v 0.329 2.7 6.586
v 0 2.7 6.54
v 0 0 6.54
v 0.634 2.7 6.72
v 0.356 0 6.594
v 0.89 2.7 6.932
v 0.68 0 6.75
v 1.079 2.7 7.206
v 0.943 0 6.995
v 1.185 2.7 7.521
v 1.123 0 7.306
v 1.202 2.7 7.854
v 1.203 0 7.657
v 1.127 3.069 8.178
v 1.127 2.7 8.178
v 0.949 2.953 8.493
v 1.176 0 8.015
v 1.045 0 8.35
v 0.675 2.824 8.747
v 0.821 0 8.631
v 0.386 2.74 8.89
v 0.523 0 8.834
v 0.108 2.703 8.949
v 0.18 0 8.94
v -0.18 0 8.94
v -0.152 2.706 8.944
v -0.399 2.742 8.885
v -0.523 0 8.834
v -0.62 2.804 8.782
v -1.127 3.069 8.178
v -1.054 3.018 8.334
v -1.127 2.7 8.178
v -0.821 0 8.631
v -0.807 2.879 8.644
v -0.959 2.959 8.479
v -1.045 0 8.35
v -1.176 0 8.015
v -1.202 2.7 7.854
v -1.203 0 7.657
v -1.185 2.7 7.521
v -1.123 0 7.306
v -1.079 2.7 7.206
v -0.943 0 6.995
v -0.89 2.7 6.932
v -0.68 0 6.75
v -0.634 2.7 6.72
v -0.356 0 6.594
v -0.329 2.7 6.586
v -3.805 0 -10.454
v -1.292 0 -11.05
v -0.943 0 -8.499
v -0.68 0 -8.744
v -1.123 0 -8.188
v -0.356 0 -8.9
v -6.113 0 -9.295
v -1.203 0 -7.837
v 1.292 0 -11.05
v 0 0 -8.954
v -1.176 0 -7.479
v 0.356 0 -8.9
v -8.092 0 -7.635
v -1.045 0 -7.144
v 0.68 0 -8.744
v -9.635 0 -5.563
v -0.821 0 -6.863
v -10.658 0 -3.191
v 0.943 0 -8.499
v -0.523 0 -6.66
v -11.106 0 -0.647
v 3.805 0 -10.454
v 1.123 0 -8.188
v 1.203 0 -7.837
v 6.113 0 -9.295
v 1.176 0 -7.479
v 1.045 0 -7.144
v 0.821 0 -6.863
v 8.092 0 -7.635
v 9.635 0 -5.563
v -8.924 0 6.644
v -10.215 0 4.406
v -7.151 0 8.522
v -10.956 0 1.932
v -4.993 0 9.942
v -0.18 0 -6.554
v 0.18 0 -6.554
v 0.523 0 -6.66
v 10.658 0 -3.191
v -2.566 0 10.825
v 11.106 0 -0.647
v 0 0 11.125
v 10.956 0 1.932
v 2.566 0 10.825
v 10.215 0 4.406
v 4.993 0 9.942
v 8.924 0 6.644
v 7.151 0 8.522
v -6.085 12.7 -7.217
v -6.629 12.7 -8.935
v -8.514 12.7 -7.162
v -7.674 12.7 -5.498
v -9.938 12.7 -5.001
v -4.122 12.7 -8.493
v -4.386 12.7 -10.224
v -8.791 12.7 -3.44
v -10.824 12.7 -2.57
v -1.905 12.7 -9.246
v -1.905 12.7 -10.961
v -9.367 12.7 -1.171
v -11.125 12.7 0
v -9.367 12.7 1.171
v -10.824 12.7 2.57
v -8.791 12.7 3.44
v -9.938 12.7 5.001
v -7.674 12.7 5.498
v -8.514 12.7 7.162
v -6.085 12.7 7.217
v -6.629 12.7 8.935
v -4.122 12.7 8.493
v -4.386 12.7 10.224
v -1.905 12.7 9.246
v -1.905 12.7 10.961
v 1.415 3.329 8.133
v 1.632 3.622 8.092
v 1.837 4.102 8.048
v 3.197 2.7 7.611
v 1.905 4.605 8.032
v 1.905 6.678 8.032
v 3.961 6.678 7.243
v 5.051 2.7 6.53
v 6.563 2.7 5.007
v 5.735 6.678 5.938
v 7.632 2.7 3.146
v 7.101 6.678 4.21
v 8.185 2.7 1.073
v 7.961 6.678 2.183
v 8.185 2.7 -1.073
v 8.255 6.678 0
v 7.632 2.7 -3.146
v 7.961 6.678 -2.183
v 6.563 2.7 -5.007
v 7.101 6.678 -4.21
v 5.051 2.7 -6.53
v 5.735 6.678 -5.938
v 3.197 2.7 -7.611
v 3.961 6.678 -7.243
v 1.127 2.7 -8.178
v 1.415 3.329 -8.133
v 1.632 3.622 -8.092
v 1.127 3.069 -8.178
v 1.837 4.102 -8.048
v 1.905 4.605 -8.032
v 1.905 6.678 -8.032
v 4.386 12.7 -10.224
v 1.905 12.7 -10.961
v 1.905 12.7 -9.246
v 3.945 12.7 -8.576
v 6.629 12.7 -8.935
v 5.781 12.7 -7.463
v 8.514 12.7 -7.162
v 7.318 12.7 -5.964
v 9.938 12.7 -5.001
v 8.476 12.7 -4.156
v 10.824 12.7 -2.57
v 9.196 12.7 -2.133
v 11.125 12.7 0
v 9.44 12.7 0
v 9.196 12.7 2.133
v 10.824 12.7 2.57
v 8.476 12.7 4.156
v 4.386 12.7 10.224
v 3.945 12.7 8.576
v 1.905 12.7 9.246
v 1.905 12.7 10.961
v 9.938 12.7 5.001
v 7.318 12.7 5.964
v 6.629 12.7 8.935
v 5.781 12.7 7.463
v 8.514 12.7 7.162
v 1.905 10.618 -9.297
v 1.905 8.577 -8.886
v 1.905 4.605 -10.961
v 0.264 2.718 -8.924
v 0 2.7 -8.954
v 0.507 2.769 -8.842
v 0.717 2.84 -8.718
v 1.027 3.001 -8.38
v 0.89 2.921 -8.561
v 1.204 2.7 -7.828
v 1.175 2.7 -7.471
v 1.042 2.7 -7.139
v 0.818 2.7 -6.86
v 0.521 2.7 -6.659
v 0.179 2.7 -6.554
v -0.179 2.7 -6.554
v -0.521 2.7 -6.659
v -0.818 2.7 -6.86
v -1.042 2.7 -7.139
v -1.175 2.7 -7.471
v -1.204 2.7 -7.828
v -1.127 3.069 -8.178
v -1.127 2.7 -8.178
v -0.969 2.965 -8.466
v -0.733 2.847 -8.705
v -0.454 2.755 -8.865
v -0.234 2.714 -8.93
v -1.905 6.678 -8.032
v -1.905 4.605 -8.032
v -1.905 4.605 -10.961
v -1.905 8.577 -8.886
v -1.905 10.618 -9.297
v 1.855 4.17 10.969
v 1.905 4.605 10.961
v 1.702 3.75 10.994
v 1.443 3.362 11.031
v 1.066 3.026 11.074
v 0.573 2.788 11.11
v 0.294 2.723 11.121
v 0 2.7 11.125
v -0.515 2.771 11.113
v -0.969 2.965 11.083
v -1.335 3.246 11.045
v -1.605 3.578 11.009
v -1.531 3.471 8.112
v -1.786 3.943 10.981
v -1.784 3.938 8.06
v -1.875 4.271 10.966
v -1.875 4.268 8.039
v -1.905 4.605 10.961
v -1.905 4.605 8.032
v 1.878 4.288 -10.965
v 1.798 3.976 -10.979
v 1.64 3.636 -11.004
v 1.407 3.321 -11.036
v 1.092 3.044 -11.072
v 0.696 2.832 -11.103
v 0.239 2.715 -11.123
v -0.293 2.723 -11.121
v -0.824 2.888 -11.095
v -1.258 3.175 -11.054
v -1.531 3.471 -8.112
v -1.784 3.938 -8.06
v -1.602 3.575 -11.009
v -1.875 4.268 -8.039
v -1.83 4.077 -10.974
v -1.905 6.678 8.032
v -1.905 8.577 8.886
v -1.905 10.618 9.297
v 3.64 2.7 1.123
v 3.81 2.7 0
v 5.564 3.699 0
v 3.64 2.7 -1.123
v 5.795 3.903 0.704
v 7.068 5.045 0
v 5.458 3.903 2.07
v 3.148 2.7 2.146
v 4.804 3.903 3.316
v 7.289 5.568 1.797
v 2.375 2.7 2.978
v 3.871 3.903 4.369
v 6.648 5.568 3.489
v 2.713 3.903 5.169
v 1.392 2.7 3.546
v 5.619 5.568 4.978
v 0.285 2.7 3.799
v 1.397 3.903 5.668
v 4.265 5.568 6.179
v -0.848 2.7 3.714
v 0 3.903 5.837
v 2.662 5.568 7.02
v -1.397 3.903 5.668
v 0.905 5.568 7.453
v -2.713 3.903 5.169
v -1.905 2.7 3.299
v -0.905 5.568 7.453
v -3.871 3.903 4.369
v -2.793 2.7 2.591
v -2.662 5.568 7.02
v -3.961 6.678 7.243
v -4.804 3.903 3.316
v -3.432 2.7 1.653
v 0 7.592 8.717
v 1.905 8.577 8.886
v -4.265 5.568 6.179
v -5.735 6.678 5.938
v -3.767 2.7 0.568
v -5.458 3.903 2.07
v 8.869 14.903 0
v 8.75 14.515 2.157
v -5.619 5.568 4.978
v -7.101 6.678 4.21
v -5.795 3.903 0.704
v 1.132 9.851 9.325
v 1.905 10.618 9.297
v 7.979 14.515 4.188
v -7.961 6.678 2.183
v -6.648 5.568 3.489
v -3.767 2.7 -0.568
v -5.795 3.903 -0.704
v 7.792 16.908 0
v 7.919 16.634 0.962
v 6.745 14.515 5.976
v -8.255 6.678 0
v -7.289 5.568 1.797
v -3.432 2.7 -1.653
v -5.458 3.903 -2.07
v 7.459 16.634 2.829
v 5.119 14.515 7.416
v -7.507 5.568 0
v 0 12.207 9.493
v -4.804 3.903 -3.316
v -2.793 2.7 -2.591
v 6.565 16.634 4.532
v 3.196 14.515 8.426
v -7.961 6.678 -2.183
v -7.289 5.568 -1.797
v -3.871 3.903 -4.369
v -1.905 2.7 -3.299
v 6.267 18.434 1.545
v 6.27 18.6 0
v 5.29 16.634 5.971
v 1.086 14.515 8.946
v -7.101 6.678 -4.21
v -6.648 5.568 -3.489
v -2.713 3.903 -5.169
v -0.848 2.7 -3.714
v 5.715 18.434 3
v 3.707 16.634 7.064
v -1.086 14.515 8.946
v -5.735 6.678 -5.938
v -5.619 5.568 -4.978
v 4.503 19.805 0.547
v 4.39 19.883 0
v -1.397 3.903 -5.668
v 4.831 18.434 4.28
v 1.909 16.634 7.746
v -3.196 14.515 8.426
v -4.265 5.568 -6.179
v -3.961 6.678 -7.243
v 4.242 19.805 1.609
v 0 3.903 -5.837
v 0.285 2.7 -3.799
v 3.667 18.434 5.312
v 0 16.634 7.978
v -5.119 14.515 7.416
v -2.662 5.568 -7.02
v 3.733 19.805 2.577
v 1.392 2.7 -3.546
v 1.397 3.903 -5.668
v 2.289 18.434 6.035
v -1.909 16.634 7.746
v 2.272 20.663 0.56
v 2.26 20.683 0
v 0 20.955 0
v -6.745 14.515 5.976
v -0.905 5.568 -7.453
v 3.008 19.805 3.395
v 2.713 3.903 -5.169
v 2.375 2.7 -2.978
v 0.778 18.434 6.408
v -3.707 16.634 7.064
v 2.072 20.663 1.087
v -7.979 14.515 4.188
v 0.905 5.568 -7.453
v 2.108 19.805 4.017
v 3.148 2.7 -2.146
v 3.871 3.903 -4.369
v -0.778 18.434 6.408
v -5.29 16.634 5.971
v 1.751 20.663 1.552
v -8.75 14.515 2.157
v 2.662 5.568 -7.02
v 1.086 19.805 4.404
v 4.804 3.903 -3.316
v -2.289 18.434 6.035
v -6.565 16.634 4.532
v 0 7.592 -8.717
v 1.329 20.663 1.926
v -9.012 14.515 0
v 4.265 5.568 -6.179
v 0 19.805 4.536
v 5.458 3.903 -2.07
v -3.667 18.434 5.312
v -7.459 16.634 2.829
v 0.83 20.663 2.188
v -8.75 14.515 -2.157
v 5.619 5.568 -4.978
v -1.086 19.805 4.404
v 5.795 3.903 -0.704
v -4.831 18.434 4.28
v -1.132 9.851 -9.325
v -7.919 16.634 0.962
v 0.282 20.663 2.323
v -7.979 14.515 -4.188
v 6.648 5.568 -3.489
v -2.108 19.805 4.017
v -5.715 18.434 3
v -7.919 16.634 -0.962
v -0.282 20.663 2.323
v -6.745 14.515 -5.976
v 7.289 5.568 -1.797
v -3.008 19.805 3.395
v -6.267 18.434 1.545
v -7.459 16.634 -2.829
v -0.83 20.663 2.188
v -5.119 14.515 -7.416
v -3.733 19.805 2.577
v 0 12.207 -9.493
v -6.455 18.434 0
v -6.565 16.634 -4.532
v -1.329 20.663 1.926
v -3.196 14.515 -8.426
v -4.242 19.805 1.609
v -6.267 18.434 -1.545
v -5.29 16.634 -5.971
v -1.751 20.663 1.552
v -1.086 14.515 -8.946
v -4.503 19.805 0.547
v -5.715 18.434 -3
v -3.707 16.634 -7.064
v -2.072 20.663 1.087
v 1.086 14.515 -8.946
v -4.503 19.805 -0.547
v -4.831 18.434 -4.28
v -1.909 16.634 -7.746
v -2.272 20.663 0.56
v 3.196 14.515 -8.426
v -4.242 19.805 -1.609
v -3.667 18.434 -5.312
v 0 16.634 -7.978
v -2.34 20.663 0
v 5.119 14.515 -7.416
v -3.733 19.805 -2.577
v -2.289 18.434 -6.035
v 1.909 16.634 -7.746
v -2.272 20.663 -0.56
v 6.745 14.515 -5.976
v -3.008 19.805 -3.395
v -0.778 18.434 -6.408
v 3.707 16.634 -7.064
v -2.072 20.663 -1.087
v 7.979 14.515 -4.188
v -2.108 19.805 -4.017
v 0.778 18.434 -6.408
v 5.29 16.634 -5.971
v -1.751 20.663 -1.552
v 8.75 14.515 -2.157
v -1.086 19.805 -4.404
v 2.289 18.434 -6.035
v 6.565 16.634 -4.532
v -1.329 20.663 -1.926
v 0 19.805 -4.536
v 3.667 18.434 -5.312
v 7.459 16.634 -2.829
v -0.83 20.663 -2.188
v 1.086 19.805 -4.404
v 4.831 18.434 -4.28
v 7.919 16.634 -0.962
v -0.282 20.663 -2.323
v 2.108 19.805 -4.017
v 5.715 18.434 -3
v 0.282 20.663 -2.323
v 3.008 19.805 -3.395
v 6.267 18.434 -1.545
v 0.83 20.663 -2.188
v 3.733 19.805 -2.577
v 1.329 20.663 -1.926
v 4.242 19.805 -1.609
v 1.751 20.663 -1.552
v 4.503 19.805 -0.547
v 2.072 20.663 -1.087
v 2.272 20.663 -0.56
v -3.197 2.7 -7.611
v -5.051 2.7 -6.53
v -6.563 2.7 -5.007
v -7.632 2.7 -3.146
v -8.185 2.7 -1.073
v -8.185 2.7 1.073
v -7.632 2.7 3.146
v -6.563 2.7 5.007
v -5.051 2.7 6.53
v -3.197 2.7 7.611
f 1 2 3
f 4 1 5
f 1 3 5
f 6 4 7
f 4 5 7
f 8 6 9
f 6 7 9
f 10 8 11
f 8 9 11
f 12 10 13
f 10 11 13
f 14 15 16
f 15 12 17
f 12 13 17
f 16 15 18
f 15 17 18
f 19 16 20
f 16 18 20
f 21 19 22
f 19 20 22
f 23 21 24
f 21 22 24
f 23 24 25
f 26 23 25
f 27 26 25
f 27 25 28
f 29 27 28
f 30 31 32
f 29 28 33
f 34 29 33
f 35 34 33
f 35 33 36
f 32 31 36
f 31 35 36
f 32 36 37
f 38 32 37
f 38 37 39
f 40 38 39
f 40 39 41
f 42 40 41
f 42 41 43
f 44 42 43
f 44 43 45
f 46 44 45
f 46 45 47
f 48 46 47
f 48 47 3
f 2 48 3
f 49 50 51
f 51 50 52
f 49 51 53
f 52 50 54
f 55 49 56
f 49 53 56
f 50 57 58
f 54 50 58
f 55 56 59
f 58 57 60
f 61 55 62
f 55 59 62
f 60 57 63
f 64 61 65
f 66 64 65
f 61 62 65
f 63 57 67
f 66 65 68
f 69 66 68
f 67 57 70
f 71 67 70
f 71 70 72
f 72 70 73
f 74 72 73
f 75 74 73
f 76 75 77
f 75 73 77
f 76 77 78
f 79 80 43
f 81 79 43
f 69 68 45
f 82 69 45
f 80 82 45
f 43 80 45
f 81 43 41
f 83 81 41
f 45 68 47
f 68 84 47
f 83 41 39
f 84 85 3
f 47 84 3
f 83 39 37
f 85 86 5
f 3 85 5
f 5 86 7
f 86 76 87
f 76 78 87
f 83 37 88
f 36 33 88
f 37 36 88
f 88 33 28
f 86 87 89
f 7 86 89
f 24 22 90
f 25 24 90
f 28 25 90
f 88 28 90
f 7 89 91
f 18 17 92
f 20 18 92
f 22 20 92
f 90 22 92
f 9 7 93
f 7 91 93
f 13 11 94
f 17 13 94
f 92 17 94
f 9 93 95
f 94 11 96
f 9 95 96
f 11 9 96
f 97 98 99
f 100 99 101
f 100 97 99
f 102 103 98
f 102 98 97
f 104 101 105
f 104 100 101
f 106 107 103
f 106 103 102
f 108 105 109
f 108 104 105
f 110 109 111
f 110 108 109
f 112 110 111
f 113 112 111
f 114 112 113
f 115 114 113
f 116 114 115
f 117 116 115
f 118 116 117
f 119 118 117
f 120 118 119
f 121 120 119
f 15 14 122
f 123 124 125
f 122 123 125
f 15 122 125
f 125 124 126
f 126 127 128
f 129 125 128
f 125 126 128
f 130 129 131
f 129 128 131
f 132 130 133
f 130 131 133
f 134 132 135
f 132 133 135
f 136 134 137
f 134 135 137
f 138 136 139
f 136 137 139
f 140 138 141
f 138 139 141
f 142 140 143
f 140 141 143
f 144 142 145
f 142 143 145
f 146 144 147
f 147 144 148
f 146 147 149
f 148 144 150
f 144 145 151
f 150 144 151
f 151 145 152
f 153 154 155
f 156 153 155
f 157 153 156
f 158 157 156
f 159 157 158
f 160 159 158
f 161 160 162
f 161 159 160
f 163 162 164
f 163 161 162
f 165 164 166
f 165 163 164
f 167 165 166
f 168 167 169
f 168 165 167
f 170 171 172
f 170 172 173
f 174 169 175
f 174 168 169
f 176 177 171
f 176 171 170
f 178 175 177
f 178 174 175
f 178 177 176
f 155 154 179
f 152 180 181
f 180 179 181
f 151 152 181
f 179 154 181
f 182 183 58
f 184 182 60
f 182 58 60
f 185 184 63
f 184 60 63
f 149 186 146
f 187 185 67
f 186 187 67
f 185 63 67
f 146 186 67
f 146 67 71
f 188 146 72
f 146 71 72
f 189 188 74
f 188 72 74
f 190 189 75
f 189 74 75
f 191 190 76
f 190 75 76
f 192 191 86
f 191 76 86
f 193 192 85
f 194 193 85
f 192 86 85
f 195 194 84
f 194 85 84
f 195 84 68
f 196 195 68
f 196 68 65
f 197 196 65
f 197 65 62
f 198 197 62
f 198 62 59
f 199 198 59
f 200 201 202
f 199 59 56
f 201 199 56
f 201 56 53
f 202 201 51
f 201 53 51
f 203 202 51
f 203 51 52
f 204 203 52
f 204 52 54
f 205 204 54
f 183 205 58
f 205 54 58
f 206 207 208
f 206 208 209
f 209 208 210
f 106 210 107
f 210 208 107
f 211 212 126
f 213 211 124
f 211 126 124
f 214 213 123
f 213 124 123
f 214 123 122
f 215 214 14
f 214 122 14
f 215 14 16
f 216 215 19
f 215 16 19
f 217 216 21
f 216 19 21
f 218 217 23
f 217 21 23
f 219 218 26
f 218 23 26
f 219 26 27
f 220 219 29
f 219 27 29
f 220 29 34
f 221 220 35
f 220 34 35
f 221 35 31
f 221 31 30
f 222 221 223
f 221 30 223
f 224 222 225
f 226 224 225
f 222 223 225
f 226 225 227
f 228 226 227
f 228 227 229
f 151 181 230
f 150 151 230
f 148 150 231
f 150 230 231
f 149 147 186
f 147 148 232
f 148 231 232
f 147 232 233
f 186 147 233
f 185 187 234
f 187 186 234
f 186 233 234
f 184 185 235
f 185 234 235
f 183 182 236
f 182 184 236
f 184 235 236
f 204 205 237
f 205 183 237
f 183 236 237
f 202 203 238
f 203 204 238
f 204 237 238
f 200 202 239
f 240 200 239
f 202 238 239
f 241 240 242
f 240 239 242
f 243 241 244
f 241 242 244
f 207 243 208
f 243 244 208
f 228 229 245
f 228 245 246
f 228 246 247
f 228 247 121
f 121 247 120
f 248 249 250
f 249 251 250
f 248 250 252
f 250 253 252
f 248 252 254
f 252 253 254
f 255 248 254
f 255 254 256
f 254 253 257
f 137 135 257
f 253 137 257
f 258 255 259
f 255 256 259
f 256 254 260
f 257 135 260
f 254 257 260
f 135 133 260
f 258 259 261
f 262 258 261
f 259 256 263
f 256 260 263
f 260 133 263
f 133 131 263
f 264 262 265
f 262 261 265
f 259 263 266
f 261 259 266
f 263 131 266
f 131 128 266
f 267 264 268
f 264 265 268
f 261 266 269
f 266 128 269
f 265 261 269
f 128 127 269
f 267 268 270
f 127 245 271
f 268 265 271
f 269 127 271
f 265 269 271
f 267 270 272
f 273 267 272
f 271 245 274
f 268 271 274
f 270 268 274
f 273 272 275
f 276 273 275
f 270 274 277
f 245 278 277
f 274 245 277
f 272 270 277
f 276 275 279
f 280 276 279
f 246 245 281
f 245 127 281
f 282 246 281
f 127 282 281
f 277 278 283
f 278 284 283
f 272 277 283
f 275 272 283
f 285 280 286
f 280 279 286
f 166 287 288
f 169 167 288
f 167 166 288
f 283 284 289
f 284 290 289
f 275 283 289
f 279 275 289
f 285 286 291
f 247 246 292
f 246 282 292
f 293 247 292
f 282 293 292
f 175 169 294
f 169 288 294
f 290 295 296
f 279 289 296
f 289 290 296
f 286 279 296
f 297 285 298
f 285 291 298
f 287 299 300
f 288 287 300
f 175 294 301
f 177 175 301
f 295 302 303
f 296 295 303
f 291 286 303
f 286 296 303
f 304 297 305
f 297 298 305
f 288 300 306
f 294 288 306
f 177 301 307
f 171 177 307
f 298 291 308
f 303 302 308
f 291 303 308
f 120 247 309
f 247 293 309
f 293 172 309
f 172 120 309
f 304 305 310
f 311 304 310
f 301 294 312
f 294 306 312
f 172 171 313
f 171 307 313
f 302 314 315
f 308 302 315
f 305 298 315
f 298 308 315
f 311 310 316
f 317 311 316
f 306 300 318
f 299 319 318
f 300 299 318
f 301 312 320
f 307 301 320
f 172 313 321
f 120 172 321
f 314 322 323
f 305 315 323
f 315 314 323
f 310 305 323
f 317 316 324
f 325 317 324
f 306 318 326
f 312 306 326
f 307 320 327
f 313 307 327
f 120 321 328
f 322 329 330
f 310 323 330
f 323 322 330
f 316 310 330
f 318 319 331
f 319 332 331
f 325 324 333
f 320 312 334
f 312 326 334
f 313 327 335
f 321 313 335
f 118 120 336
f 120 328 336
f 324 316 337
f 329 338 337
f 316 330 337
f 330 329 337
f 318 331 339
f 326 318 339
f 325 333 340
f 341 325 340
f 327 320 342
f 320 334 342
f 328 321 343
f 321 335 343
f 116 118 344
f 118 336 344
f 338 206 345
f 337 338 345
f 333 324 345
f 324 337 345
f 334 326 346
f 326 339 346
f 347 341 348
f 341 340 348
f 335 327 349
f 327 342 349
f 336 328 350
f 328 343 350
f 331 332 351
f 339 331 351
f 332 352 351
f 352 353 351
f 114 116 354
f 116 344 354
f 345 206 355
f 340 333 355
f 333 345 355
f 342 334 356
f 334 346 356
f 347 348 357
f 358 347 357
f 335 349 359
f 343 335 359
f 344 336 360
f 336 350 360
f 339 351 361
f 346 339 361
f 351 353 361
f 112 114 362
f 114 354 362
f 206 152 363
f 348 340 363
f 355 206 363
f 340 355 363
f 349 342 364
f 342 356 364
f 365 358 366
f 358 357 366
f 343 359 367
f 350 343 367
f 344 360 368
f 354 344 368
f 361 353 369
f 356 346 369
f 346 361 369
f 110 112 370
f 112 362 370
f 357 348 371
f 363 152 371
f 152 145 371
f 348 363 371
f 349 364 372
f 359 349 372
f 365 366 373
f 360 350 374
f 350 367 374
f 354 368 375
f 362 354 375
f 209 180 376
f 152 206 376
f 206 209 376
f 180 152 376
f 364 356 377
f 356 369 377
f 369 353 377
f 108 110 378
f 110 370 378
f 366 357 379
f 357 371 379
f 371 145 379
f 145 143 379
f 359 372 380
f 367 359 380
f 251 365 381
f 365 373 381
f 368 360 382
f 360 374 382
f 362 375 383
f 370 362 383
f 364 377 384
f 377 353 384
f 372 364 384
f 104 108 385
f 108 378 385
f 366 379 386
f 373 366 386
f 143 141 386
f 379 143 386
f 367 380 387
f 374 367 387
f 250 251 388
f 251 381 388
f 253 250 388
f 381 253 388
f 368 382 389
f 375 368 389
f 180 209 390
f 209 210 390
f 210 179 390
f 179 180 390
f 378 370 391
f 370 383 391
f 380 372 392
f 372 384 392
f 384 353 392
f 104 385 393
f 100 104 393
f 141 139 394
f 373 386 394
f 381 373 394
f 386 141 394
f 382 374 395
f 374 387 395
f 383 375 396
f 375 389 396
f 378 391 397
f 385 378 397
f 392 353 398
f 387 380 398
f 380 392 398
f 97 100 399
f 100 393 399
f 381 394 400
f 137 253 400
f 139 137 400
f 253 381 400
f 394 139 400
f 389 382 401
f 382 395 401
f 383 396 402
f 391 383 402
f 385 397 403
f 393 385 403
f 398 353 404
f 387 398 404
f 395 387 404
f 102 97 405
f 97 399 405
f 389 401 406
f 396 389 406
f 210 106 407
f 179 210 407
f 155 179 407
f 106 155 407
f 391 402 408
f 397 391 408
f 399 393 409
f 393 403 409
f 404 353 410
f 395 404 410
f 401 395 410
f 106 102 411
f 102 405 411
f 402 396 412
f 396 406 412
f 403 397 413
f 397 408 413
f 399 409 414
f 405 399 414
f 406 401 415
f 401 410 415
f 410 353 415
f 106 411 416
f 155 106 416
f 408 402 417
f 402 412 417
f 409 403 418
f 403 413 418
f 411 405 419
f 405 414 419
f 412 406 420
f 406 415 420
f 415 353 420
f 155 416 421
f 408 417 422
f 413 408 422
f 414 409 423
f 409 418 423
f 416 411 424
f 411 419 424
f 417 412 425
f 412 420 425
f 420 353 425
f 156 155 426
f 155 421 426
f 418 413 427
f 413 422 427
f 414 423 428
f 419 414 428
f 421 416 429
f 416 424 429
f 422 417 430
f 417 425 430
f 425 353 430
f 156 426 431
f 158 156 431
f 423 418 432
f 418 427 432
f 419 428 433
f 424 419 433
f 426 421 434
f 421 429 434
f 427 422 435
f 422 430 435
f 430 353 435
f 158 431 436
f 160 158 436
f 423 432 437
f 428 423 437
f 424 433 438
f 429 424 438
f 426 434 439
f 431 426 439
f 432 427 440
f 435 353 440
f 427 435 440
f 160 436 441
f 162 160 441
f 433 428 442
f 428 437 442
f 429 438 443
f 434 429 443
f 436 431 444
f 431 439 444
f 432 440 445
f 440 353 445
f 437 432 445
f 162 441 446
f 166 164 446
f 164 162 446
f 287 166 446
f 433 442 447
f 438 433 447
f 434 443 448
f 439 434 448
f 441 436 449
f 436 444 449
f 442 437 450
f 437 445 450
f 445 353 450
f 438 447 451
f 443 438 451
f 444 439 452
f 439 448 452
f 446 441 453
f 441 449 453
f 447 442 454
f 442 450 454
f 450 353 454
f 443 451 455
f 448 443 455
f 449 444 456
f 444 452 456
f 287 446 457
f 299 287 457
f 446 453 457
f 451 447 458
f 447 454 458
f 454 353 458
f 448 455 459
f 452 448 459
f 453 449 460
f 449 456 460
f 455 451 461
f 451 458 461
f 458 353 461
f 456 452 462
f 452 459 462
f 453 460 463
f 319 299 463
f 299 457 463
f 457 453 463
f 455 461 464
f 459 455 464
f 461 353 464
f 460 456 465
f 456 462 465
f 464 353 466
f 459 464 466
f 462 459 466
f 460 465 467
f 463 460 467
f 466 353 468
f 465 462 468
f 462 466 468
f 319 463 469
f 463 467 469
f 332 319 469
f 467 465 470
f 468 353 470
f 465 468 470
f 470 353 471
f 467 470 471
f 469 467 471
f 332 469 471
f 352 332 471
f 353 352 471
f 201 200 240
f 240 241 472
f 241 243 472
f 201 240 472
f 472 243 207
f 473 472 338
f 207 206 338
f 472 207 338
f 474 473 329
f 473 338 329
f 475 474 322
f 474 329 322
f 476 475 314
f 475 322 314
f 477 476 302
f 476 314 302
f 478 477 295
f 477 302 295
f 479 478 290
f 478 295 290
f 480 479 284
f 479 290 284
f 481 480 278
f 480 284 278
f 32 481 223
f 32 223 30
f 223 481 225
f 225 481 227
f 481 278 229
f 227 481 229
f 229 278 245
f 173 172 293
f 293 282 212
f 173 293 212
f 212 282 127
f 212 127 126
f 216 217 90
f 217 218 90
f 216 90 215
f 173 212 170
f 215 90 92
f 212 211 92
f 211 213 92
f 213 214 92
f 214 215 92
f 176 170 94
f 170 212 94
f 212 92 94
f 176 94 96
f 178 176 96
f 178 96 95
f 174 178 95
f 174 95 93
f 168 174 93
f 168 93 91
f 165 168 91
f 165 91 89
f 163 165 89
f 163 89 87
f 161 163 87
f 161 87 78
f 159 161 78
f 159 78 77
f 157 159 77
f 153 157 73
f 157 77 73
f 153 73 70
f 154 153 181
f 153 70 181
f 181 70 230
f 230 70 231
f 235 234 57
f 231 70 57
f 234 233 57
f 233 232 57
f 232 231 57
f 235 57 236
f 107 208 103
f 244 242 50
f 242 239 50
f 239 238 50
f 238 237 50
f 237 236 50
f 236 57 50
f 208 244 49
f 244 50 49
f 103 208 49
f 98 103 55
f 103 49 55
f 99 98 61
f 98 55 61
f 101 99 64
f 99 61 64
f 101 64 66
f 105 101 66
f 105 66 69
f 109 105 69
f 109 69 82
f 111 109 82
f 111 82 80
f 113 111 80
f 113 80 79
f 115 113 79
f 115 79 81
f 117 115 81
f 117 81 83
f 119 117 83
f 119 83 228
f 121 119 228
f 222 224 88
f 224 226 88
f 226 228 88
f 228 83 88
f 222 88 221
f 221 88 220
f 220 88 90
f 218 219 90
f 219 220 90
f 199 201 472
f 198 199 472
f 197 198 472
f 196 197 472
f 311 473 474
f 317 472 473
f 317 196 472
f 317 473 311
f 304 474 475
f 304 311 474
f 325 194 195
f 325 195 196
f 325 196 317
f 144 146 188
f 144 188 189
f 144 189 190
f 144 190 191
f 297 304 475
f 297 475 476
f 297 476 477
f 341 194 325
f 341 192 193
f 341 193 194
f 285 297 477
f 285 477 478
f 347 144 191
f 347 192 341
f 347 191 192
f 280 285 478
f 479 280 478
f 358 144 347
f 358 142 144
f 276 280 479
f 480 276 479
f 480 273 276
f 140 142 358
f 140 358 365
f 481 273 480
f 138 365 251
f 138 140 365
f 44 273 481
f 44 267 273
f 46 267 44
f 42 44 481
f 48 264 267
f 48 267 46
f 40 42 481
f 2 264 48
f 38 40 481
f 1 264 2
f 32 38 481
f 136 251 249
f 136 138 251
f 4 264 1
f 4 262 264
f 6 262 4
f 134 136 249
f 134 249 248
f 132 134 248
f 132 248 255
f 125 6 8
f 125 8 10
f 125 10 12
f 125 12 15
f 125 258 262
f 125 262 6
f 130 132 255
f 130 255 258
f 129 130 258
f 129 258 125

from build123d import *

# Parameters (mm, degrees)
SKETCH1_R           = 11.1252
BOSS_EXTRUDE1_DEPTH = 12.7
SKETCH4_R           = 8.255
CUT_EXTRUDE2_DEPTH  = 10
CUT_EXTRUDE1_DEPTH  = 28.930993094
CUT_EXTRUDE3_REACH  = 28.204
SKETCH5_R           = 1.2065


with BuildPart() as part:
    # Sketch1 → Boss-Extrude1 (new body)
    with BuildSketch(Plane(origin=(0, 0, 0), x_dir=(1, 0, 0), z_dir=(0, 1, 0))):
        Circle(SKETCH1_R)
    extrude(amount=BOSS_EXTRUDE1_DEPTH)

    # Sketch4 → Cut-Extrude2 (cut)
    with BuildSketch(Plane(origin=(0, 12.7, 0), x_dir=(1, 0, 0), z_dir=(0, 1, 0))):
        Circle(SKETCH4_R)
    extrude(amount=-CUT_EXTRUDE2_DEPTH, mode=Mode.SUBTRACT)

    # Sketch3 → Cut-Extrude1 (cut, through all)
    with BuildSketch(Plane(origin=(0, 0, -11.1252), x_dir=(-1, 0, 0), z_dir=(0, 0, -1))):
        with BuildLine():
            Line((-1.905, 12.7), (-1.905, 4.605))
            ThreePointArc((-1.905, 4.605), (0, 2.7), (1.905, 4.605))
            Line((1.905, 4.605), (1.905, 12.7))
            Line((1.905, 12.7), (-1.905, 12.7))
        make_face()
    extrude(amount=-CUT_EXTRUDE1_DEPTH, mode=Mode.SUBTRACT)

    # Sketch2 → Revolve3 (revolve)
    with BuildSketch(Plane.XY):
        with BuildLine():
            Line((0, 20.955), (0, 1.905))
            ThreePointArc((0, 1.905), (9.525, 11.43), (0, 20.955))
        make_face()
    revolve(axis=Axis((0, 20.955, 0), (0, -1, 0)))

    # Sketch5 → Cut-Extrude3 (cut, up to next)
    with BuildSketch(Plane.XZ, mode=Mode.PRIVATE) as cut_extrude3_sk1:
        with Locations((0, 7.747)):
            Circle(SKETCH5_R)
    cut_extrude3_tool1 = extrude(cut_extrude3_sk1.sketch, amount=-CUT_EXTRUDE3_REACH, mode=Mode.PRIVATE) & part.part
    # Sketch5 → Cut-Extrude3 (cut, up to next)
    with BuildSketch(Plane.XZ, mode=Mode.PRIVATE) as cut_extrude3_sk2:
        with Locations((0, -7.747)):
            Circle(SKETCH5_R)
    cut_extrude3_tool2 = extrude(cut_extrude3_sk2.sketch, amount=-CUT_EXTRUDE3_REACH, mode=Mode.PRIVATE) & part.part
    add(cut_extrude3_tool1.solids().sort_by_distance((0, 0, 7.747))[0], mode=Mode.SUBTRACT)
    add(cut_extrude3_tool2.solids().sort_by_distance((0, 0, -7.747))[0], mode=Mode.SUBTRACT)


solid = part.part
